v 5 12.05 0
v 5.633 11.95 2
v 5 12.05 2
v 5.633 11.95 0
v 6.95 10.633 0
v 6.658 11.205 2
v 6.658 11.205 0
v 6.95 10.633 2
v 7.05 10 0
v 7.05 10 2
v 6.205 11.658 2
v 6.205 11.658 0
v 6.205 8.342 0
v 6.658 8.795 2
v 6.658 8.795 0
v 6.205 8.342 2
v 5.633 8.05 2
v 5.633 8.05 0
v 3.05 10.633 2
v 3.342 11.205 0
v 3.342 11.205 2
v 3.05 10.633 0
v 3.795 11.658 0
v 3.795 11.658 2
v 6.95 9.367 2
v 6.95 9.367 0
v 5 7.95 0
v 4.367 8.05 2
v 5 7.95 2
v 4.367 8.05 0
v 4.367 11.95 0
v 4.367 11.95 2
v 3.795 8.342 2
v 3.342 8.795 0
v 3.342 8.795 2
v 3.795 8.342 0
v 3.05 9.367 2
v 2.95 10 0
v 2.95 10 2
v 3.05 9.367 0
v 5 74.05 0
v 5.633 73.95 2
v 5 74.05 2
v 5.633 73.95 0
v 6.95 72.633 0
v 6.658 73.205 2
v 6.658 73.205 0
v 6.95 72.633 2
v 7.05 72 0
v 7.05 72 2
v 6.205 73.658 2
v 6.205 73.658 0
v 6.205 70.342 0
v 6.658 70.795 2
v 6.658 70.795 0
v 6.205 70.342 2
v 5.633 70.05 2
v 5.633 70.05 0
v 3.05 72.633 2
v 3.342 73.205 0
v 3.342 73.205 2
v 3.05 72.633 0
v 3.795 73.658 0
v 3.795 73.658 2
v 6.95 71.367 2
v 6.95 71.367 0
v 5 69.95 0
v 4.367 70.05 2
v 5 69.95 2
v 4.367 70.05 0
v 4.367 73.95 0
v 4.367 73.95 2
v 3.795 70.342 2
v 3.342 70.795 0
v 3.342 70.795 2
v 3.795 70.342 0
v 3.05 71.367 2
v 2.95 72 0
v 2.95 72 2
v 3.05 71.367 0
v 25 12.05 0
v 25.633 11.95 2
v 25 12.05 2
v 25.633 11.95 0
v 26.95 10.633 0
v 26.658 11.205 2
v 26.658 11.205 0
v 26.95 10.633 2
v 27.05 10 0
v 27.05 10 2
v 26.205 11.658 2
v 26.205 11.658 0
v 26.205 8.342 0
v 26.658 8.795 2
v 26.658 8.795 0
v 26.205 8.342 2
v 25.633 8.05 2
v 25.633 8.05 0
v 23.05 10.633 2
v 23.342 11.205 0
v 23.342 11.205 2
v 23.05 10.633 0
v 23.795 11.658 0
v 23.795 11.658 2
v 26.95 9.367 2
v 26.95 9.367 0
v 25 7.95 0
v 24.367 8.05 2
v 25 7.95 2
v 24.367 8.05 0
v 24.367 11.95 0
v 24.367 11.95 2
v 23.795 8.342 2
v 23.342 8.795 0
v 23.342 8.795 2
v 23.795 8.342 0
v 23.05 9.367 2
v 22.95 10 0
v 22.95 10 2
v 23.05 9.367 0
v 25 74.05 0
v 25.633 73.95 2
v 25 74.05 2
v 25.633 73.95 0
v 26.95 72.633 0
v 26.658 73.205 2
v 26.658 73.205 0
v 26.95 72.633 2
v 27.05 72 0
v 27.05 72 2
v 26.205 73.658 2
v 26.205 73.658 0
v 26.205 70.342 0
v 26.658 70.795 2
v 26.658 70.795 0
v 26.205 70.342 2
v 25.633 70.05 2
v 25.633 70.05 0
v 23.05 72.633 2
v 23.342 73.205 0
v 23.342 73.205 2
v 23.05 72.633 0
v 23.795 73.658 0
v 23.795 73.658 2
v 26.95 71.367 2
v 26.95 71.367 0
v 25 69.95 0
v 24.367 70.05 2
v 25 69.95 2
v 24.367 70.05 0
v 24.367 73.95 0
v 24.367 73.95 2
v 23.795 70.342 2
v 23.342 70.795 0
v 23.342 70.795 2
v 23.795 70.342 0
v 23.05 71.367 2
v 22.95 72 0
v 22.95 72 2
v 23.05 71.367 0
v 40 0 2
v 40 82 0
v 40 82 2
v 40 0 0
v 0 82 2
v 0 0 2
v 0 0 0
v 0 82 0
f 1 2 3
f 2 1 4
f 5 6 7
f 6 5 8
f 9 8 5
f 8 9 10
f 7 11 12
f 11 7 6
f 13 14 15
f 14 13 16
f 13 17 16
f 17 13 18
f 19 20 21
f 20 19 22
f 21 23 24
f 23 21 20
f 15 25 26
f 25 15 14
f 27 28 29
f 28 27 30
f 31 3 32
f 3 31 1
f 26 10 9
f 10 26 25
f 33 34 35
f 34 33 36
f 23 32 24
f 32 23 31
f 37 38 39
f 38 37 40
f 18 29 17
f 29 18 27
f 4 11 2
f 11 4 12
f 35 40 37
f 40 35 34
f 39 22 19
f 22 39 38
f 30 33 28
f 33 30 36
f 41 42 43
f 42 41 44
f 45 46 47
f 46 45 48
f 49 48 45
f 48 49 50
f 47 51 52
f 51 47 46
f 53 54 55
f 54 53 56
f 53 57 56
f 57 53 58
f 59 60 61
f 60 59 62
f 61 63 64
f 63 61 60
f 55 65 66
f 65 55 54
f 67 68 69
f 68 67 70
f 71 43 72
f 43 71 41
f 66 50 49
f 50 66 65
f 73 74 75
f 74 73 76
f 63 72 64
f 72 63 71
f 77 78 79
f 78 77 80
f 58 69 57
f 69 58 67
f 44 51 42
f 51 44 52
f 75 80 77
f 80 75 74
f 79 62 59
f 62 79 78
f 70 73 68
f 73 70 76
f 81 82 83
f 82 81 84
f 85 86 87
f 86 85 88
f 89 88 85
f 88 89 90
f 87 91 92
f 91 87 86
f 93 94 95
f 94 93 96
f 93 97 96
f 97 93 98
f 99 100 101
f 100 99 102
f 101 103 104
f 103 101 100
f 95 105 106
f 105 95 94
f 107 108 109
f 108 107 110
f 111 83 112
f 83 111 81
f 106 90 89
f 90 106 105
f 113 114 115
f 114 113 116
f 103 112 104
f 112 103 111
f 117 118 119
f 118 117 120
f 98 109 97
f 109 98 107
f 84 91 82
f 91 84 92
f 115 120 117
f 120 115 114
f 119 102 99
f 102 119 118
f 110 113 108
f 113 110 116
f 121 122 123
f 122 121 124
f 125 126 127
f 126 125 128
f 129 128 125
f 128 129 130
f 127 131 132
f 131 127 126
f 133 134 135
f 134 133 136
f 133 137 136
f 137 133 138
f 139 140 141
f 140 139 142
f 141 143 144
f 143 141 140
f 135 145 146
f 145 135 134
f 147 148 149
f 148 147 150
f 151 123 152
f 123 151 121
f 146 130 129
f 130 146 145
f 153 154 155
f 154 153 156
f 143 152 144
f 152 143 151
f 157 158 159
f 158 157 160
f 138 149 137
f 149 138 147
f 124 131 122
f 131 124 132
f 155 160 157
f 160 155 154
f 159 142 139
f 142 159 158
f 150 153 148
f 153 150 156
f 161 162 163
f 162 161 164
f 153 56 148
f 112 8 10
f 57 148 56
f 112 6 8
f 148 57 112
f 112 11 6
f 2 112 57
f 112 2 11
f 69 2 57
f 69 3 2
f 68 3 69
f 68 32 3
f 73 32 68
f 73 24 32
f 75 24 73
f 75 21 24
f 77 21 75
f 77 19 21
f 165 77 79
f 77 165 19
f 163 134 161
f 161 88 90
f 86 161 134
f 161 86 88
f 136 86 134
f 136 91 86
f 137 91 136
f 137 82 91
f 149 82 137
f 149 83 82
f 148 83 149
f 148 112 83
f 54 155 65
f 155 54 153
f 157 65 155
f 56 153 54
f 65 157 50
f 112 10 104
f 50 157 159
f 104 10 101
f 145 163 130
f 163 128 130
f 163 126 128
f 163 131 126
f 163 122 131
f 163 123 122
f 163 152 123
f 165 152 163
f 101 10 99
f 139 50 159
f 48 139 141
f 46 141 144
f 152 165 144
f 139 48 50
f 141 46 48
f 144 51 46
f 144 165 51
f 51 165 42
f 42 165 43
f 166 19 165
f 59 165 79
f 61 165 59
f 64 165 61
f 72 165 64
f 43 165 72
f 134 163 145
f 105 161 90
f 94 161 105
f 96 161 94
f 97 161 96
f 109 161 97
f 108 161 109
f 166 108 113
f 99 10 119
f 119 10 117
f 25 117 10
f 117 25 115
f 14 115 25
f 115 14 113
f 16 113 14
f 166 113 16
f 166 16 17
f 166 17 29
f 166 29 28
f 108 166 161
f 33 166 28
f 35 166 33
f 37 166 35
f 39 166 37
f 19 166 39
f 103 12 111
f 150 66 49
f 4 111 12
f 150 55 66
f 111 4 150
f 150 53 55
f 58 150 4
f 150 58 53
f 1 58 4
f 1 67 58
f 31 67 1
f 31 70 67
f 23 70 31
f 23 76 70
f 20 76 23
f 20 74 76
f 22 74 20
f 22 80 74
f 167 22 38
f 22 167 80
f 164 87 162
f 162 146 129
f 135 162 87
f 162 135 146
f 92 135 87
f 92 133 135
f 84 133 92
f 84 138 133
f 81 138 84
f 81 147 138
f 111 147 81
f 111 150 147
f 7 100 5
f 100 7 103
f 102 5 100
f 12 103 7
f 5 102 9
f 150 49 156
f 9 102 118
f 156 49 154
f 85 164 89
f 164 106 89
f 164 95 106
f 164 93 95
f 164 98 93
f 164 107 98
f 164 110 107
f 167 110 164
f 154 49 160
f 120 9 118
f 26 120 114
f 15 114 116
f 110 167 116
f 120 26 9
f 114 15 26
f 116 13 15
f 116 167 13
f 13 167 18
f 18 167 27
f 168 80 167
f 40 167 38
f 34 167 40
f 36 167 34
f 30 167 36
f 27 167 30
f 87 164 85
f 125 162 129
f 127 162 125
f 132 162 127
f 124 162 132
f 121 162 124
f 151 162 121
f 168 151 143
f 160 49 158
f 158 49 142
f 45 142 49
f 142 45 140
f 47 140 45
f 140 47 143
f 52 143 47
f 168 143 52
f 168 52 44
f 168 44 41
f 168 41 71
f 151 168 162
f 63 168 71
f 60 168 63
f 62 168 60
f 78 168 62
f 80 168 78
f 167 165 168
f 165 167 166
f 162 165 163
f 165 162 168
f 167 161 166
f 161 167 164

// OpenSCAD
// file: bbs_panel.scad
//
// Panel for rack.  This can screw on to the front or back of a rack.  This is a basic
// blank panel.  It can be modified with cutouts for any assortment of switches, LEDs,
// LCDs, connectors, and whatever else you can think of.  The height of the panel is
// measured in frames, which is the number of screw holes spaced 20mm apart.
//

use <bbs_shapes.scad>
use <bbs_rack.scad>

module bbs_panel(frames)
{
    $fn = 20;
    length = frames *20;
    width = 161;
    height = 2;
    screw = 4.1/2;
    difference()
    {
        cube([length, width + 10, height]);
        union()
        {
            for(a = [5:20:length-10])
            {
                translate([a, 10, -1]) cylinder(r=screw, h=height + 2);
                translate([a, width, -1]) cylinder(r=screw, h=height + 2);
            }
        }
    }
}

bbs_panel(2);
// file: bbs_tray.scad
//
// Basic sliding tray to mount in a rack.  Varients of this tray can
// hold different electronic devices.  The knobs parameter is a boolean
// to determine in knobs are added to the tray (the default) or not.
// One may wish to omit the knobs if, for example, one wants a panel to
// cover the tray.
//
use <bbs_shapes.scad>
length=198;
width=160;
//module prism(l)
//{
//    linear_extrude(height=l) polygon([[0,0], [0,5], [2.5,2.5]]);
//}
module bbs_tray(knobs=true)
{
    difference()
    {
        union()
        {
            cube([length, width, 3], center=false); // Base
            translate([0, 0, 6])rotate([0, 90, 0]) rotate([0, 0, -90]) bbs_prism1(5, length); // Rail
            translate([0, width, 1])rotate([0, 90, 0]) rotate([0, 0, 90]) bbs_prism1(5, length); // Rail
            translate([0, 0, 0]) cube([length, 8, 7], center=false); // Side
            translate([0, width - 8, 0]) cube([length, 8, 7], center=false); // Side
//
            if (knobs)
            {
                translate([length, 3, 4]) rotate([0, 90, 0]) cylinder($fn=12, h=5, r=3);
                translate([length + 5, 0, 0]) cube([5, 8, 8], center=false); // Knob
                translate([length, width - 4, 4]) rotate([0, 90, 0]) cylinder($fn=12, h=5, r=3);
                translate([length + 5, width - 8, 0]) cube([5, 8, 8], center=false); // Knob
            }
        }
        union()
        {
        }
    }
}

bbs_tray();
// file: bbs_rack.scad
//
// Extendable rack for trays
//

use <bbs_shapes.scad>
use <bbs_tray.scad>
use <bbs_panel.scad>

width = 161;
length = 200;
screw1 = 4.4/2;
screw2 = 4.1/2;
screw3 = 4.5/2;
//
// Set this to be a reasonable height limit for your printer
//
arbitrary_printer_limit = 150;
//
// The parameter "frames" sets the height of the rack in number of screw holes.  The base rack with no
// screw holes is actually one frame tall.  Setting this parameter to less than 1 will probably not
// provide satisfactory results.
//
module bbs_rack(frames)
{
    $fn=20;
    height = frames*20 + 15;
    if (height > arbitrary_printer_limit)
    {
        echo("Warning: object height of ", height, "might cause problems.");
    }
    rail_offset = 3;
    difference()
    {
        union()
        {
            //
            // Frame
            //
            cube([5, 170, 5]);
            cube([length, 5, 12 + rail_offset]);
            cube([15, 4, height]);
            translate([0, width + 5, 0]) cube([length, 5, 12 + rail_offset]);
            translate([0, width + 6, 0]) cube([15, 4, height]);
            translate([length - 5, 0, 0]) cube([5, width + 10, 3.5]);
            translate([length - 15, 0, 0]) cube([15, 4, height]);
            translate([length - 15, width + 5, 0]) cube([15, 4, height]);
            translate([0, 0, height + 5]) rotate([0, 90, 0]) bbs_prism2(10, length);
            translate([0, width + 10, height + 5]) rotate([270, 0, 0]) rotate([0, 90, 0]) bbs_prism2(10, length);
            //
            // Flanges
            //
            translate([0, 0, 5]) cube([2, 15, height]);
            translate([0, width - 5, 5]) cube([2, 15, height]);
            translate([length - 2, 0, 15 + rail_offset]) cube([2, 15, height - 10 - rail_offset]);
            translate([length - 2, width - 5, 15 + rail_offset]) cube([2, 15, height - 10 - rail_offset]);
            translate([5, 0, 12]) cube([length - 5, 2, height - 10]);
            translate([5, width + 8, 12]) cube([length - 5, 2, height - 10]);
            //
            translate([5, 5, 0]) cube([length - 10, 10, 5]);
            translate([5, width - 5, 0]) cube([length - 10, 10, 5]);
            translate([0, 5, height + 3]) cube([length, 10, 2]);
            translate([0, width - 5, height + 3]) cube([length, 10, 2]);
            //
            // Some bevels on the top flanges this improves printing the top flanges.
            //
            translate([0, 5, height + 1 ]) rotate([11, 0, 0]) cube([length, 10, 2]);
            translate([0, width - 5, height + 3]) rotate([-11, 0, 0]) cube([length, 10, 2]);
            //
            // Other little bits and pieces mostly for support
            //
            translate([length - 2, 4, 15 + rail_offset]) rotate([0, 0, 0]) rotate([0, 90, 0]) bbs_prism2(5, 2);
            translate([length - 2, width + 5, 15 + rail_offset]) rotate([270, 0, 0]) rotate([0, 90, 0]) bbs_prism2(4, 2);
        }
        //
        // Parts describing things to be removed
        //
        union()
        {
            //
            // Slides fpr rails
            //
            translate([2, 5.01, 11 + rail_offset]) rotate([0, 90, 0]) rotate([0, 0, -90]) bbs_prism1(5.02, length);
            translate([2, width + 4.99, 6 + rail_offset]) rotate([0, 90, 0]) rotate([0, 0, 90]) bbs_prism1(5.02, length);
            //
            // Mounting screw holes - horizontal
            //
            for(a = [20 + rail_offset:20:height])
            {
                translate([10, -1, a]) rotate([-90, 0, 0]) cylinder(r=screw1, h=width+20);
                translate([length -10, -1, a]) rotate([-90, 0, 0]) cylinder(r=screw1, h=width+20);
                translate([-1, 10, a]) rotate([0, 90, 0]) cylinder(r=screw2, h=length+10);
                translate([-1, width, a]) rotate([0, 90, 0]) cylinder(r=screw2, h=length+10);
            }
            //
            // Mounting screw holes - vertical
            //
            for(a = [20:20:length-10])
            {
                translate([a, 10, -1]) cylinder(r=screw3, h=height + 10);
                translate([a, width , -1]) cylinder(r=screw3, h=height + 10);
            }
            //
            // Side vents
            //
            for(a = [23:22:length-20])
            {
                translate([a, -1, 17 + rail_offset]) rotate([-90, 0, 0]) hull() 
                {
                    translate([0, -3, 0]) cylinder(r=7.5, h=width + 20);
                    translate([0, -(height - 25 - rail_offset), 0]) cylinder(r=5, h=width + 20);
                }
            }
            //
            // Round off a couple corners
            //
            translate([length - 2.5, 15.01, 14.99 + rail_offset]) rotate([180, 0, 0]) rotate([0, 90, 0])bbs_fillet(5, 3);
            translate([length - 2.5, width - 5.01, 14.99 + rail_offset]) rotate([90, 0, 0])rotate([0, 90, 0]) bbs_fillet(5, 3);
        }
    }
}

union()
{
    bbs_rack(4);
//    translate([2, 5, 5 + 3]) color("red") bbs_tray();
//    translate([length + 2, 0, 18])rotate([0, 270, 0]) color("blue") bbs_panel(2);
}
// file: bbs_shapes.scad
//
// This is a catalogu of shapes that are used in other structures.  Each shape is
// parameterized to make them more flexible.
//
//===================================
// Triangular prism type 1.  This takes the form of an isosolese right triangle.
// The triangle is oriented with the hypotonuse in the y direction.  Extrusion is in the
// z direction.  Origin is at one end of the hypotonuse.
//
// Parameters
// s - size of triangle (length of hypotonuse)
// l - length of prism
//
module bbs_prism1(s, l)
{
    linear_extrude(height=l) polygon([[0, 0], [0, s], [s/2, s/2]]);
}
//
//===================================
// Triangular prism type 2.  This takes the form of an isosolese right triangle.
// The triangle is oriented with the right angle at the origin.  Extrusion is in the
// z direction.
//
// Parameters
// s - size of triangle (length of sides)
// l - length of prism
//
module bbs_prism2(s, l)
{
    linear_extrude(height=l) polygon([[0, 0], [0, s], [s, 0]]);
}
//
//===================================
// Fillet.  This is a square with a circle removed from it.  The circle
// has a radius equal to the square's sides and is positioned at one of the corners.  The
// length is in the z  direction.
//
// Parameters
// s - size of fillet
// l - length of extrusion
//
module bbs_fillet(s, l)
{
    difference()
    {
        cube([s, s, l]);
        translate([s, s, -0.1]) cylinder(r=s, h=l+0.2);
    }
}
//
//===================================
// Spacer.  This is a cylinder with a cylinder removed from the center of it.  It
// would typically be used to around a bolt to add some space like a standoff or
// as a washer.
//
// Parameters
// od - outside diameter
// id - inside diameter
// height - height
//
module bbs_spacer(od, id, height)
{
    difference()
    {
        cylinder(r=od/2, h=height, $fn=20);
        translate([0, 0, -0.1]) cylinder(r=id/2, h=height + 0.2, $fn=20);
    }
}
//
// Examples
//
//bbs_prism1(3, 5);
//translate([0, 7, 0]) bbs_prism2(3, 5);
//translate([7, 0, 0]) bbs_fillet(3, 5);
//bbs_spacer(23, 10, 16);
bbs_spacer(6, 4, 2);
// file: bbs_mini_rack_size.scad
//
// Constants to define the size of a mini rack and its components.  Using this include file will
// help to ensure that all components have a consistent size.  Other file can be created for other sizes
// of racks.  In those cases, ensure that the proper size file is included.
//
// Use functions for constants that should be exported
//
function bbs_rack_width() = 72;
function bbs_rack_length() = 100;
// main file
//
// Panel for rack.  This can screw on to the front or back of a rack.  This is a basic
// blank panel.  It can be modified with cutouts for any assortment of switches, LEDs,
// LCDs, connectors, and whatever else you can think of.  The height of the panel is
// measured in frames, which is the number of screw holes spaced 20mm apart.
//

use <bbs_mini_rack_size.scad>
use <bbs_shapes.scad>
use <bbs_rack.scad>

module bbs_panel(frames)
{
    $fn = 20;
    length = frames *20;
    height = 2;
    screw = 4.1/2;
    difference()
    {
        cube([length, bbs_rack_width()+10, height]);
        union()
        {
            for(a = [5:20:length-10])
            {
                translate([a, 10, -1]) cylinder(r=screw, h=height + 2);
                translate([a, bbs_rack_width(), -1]) cylinder(r=screw, h=height + 2);
            }
        }
    }
}

bbs_panel(2);
